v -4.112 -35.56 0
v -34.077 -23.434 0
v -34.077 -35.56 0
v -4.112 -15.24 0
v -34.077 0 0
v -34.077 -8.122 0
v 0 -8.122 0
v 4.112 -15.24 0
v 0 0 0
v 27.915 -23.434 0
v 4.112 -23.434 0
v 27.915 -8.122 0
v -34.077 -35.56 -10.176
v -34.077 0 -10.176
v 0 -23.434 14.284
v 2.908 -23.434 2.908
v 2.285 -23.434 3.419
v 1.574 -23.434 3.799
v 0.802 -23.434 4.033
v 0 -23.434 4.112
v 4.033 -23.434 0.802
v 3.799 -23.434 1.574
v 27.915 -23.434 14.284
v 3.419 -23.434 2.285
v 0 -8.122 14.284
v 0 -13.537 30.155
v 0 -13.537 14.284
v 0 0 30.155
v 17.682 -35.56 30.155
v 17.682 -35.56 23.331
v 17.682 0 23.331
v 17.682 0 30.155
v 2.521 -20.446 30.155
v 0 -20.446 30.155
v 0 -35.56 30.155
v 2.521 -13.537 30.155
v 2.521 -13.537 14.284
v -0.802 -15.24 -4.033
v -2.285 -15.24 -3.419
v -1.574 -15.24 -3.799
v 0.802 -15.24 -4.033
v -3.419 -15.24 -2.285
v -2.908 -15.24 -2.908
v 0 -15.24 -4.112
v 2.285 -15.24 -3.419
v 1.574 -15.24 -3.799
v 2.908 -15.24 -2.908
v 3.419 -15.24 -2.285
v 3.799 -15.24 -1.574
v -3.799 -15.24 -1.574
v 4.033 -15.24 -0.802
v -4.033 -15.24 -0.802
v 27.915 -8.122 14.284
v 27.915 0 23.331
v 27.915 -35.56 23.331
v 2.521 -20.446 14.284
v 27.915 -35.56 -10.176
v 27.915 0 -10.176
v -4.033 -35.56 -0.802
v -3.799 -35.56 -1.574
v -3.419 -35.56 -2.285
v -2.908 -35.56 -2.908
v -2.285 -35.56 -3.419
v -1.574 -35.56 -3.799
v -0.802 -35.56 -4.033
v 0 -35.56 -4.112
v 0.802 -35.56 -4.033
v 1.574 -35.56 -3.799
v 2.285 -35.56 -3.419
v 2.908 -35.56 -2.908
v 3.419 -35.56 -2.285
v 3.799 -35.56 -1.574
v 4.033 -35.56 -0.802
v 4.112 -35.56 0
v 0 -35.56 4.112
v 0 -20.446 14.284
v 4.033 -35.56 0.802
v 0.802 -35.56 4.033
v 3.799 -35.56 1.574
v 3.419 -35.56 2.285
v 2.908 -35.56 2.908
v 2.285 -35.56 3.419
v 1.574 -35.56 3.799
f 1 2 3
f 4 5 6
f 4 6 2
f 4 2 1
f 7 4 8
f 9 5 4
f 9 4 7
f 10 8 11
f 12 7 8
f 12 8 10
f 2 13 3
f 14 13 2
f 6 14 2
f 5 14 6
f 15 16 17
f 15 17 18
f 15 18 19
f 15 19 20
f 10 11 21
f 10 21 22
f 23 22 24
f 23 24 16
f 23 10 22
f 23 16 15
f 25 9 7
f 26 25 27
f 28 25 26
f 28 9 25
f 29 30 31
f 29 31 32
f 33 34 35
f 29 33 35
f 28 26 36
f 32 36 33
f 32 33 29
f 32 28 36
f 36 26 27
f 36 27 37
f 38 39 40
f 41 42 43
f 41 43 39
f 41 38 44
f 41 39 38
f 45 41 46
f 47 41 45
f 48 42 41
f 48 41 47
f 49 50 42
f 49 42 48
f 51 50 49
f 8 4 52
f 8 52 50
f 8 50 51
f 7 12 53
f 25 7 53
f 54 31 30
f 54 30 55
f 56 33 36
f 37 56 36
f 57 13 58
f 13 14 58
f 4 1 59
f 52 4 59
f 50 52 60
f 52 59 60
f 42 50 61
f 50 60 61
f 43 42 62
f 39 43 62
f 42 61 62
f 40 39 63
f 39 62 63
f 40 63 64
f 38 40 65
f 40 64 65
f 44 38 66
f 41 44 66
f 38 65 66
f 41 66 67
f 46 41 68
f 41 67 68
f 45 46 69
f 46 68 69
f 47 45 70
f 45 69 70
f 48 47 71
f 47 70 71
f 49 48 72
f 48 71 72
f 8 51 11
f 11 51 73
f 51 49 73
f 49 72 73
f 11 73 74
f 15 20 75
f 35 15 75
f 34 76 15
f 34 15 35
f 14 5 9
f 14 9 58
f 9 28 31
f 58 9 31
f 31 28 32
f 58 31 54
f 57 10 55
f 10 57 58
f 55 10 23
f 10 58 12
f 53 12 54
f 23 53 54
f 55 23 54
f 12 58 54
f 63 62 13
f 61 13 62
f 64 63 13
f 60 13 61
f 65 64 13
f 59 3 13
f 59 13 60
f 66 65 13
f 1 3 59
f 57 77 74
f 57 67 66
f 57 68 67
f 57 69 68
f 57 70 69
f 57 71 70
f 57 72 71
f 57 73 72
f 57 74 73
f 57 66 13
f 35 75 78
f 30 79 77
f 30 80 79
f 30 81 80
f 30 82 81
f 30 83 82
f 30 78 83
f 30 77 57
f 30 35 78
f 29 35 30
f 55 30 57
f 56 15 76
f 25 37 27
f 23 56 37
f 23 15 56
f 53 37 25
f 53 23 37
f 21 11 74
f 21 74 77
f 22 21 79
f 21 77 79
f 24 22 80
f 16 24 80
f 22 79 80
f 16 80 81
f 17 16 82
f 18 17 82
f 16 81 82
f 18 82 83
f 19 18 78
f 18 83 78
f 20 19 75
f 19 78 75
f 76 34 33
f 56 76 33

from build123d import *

# Parameters (mm, degrees)
F0_W           = 61.9914149866
F0_H           = 40.331762284
F1_DEPTH       = 20.32
F2_DEPTH       = 15.24
F5_R           = 4.1121060328
F6_DEPTH       = 20.32
F7_W           = 14.0040833503
F7_H           = 6.9086803123
F8_DEPTH       = 17.78
F9_W           = 15.3111321852
F9_H           = 14.2841655761
F10_DEPTH      = 61.9924149866
F10_DEPTH_BACK = 25.4
F11_W          = 10.2332767595
F11_H          = 6.8242249937
F12_DEPTH      = 35.561
F13_W          = 34.0766059235
F13_H          = 30.1554612815
F14_DEPTH      = 35.561


# Not quite as in the source:
# - the program builds the solid bodies; features that only make, move or delete a surface that nothing else refers to are left out


with BuildPart() as f1:
    # F0 (on Front) → F1 (new body)
    with BuildSketch(Plane.XZ):
        with Locations((-3.0808984302, 9.9895801395)):
            Rectangle(F0_W, F0_H)
    extrude(amount=F1_DEPTH)

    # F2 (add): a face of the model
    f2_faces = [f1.faces().sort_by_distance(p)[0] for p in [
        (-3.0808984302, -20.32, 9.9895801395),
    ]]
    extrude(f2_faces, amount=F2_DEPTH)

    # F5 (on face) → F6 (cut)
    with BuildSketch(Plane.XZ.offset(35.56)):
        Circle(F5_R)
    extrude(amount=-F6_DEPTH, mode=Mode.SUBTRACT)

    # F7 (on face) → F8 (cut)
    with BuildSketch(Plane.XY.offset(30.1554612815)):
        with Locations((-4.4813072309, -16.991621349)):
            Rectangle(F7_W, F7_H)
    extrude(amount=-F8_DEPTH, mode=Mode.SUBTRACT)

    # F9 (on face) → F10 (cut, two sides)
    with BuildSketch(Plane.YZ.offset(27.9148090631)) as f10_sk:
        with Locations((-15.7779348083, 7.1420827881)):
            Rectangle(F9_W, F9_H)
    extrude(amount=-F10_DEPTH, mode=Mode.SUBTRACT)
    extrude(f10_sk.sketch, amount=F10_DEPTH_BACK, mode=Mode.SUBTRACT)

    # F11 (on face) → F12 (cut, through all)
    with BuildSketch(Plane.XZ.offset(35.56)):
        with Locations((22.7981706833, 26.7433487847)):
            Rectangle(F11_W, F11_H)
    extrude(amount=-F12_DEPTH, mode=Mode.SUBTRACT)

    # F13 (on face) → F14 (cut, through all)
    with BuildSketch(Plane.XZ):
        with Locations((-17.0383029617, 15.0777306408)):
            Rectangle(F13_W, F13_H)
    extrude(amount=F14_DEPTH, mode=Mode.SUBTRACT)


solid = f1.part
